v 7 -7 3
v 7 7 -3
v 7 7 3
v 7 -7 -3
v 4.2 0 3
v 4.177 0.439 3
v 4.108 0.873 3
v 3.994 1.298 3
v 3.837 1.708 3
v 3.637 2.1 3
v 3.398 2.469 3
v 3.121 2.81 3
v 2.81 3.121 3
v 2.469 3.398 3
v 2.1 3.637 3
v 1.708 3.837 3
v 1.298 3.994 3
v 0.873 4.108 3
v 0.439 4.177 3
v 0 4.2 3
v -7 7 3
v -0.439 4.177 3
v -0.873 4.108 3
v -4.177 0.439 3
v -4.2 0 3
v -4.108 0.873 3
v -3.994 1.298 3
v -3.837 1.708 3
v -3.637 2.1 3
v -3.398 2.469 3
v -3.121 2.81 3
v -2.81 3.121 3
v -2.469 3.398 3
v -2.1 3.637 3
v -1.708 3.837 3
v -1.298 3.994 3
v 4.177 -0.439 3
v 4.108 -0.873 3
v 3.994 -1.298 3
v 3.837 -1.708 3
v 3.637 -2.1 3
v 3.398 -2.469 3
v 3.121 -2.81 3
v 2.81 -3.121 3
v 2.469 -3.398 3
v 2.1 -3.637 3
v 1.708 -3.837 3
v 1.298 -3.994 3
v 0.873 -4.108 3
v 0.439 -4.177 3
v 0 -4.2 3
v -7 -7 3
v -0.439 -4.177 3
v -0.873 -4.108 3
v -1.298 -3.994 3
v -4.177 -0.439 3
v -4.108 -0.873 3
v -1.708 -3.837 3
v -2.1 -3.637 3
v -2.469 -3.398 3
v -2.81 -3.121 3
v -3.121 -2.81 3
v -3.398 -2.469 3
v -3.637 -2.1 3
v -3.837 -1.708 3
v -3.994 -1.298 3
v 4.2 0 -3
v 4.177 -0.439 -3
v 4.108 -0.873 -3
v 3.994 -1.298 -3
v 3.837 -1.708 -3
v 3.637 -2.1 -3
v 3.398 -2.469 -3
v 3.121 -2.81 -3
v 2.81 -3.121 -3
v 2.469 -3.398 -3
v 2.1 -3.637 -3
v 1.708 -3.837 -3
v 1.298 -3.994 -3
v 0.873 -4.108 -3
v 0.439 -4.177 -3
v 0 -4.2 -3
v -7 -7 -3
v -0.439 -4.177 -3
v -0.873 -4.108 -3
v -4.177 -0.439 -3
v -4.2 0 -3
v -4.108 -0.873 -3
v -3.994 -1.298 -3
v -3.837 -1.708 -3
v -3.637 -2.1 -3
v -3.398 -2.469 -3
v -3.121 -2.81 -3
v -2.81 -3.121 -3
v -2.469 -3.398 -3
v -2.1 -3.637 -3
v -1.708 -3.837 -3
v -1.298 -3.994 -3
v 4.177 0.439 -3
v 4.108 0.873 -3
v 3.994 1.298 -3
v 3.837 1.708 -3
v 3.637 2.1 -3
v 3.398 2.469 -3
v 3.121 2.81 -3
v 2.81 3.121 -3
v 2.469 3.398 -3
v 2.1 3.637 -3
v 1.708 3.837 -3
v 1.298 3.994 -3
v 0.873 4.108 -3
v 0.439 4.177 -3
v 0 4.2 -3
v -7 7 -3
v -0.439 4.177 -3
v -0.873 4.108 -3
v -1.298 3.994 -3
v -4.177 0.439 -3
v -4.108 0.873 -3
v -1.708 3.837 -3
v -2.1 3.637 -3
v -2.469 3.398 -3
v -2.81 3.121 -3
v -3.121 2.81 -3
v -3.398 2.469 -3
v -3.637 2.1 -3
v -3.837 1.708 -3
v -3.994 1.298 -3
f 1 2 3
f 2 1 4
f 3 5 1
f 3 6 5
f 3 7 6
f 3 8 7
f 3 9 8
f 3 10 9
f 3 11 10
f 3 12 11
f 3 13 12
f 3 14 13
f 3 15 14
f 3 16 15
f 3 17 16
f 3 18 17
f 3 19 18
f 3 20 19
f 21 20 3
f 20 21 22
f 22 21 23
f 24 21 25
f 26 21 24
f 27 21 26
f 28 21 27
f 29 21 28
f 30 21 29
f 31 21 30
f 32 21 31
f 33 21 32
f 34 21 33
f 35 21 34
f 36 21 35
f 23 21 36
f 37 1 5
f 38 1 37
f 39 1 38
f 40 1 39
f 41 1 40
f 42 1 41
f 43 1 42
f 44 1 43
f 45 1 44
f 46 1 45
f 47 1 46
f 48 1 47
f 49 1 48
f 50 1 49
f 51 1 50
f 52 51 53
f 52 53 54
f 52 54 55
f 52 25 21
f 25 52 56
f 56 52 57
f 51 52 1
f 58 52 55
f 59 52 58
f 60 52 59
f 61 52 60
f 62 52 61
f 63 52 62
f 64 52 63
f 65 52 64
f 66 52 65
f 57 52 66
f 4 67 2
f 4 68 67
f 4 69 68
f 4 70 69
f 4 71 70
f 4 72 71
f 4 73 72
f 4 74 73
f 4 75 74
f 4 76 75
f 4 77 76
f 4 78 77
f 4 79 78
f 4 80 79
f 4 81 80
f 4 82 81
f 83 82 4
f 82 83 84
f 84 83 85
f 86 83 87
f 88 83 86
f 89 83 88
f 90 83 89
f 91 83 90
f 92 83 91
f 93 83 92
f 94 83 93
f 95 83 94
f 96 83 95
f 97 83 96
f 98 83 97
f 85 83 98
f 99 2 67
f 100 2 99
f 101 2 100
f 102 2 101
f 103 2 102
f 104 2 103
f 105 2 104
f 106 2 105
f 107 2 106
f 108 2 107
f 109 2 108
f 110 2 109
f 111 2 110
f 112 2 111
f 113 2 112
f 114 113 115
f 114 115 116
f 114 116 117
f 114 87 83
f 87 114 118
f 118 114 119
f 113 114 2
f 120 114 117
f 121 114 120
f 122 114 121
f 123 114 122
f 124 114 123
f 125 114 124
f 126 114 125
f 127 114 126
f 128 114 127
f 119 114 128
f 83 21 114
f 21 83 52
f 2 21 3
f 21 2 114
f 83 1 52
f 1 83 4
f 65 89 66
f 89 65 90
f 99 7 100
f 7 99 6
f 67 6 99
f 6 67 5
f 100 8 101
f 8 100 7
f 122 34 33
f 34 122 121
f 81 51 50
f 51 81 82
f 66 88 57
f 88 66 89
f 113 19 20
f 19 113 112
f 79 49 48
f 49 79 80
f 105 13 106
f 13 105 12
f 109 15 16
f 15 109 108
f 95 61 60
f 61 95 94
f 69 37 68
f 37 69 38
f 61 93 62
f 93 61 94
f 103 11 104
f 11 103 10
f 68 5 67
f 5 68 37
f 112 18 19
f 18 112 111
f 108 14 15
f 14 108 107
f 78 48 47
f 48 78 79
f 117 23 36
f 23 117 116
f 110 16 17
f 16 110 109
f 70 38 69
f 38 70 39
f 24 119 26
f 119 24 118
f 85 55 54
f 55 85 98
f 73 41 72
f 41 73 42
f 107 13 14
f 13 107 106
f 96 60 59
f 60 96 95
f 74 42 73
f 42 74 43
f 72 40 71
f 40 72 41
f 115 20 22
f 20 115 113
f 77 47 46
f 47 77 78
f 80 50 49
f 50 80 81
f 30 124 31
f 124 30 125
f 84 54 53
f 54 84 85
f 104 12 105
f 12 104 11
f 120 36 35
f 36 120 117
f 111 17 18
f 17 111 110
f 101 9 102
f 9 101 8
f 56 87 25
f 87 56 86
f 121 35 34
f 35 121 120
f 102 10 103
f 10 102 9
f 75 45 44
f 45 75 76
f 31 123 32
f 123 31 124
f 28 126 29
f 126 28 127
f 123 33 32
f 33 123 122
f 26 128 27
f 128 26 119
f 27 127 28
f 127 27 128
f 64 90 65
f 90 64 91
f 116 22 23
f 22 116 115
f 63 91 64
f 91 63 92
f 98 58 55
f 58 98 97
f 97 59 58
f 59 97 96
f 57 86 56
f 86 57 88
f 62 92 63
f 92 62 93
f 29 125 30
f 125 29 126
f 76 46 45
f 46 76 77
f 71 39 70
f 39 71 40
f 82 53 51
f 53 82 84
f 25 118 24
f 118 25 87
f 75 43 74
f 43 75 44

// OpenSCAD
// Square nut.
$fn = 60;
eps = 0.02;
thread_d = 8.4;
side = 14;
thickness = 6;
difference() {
    cube([side, side, thickness], center = true);
    translate([0, 0, -thickness / 2 - eps]) cylinder(d = thread_d, h = thickness + 2 * eps);
}
